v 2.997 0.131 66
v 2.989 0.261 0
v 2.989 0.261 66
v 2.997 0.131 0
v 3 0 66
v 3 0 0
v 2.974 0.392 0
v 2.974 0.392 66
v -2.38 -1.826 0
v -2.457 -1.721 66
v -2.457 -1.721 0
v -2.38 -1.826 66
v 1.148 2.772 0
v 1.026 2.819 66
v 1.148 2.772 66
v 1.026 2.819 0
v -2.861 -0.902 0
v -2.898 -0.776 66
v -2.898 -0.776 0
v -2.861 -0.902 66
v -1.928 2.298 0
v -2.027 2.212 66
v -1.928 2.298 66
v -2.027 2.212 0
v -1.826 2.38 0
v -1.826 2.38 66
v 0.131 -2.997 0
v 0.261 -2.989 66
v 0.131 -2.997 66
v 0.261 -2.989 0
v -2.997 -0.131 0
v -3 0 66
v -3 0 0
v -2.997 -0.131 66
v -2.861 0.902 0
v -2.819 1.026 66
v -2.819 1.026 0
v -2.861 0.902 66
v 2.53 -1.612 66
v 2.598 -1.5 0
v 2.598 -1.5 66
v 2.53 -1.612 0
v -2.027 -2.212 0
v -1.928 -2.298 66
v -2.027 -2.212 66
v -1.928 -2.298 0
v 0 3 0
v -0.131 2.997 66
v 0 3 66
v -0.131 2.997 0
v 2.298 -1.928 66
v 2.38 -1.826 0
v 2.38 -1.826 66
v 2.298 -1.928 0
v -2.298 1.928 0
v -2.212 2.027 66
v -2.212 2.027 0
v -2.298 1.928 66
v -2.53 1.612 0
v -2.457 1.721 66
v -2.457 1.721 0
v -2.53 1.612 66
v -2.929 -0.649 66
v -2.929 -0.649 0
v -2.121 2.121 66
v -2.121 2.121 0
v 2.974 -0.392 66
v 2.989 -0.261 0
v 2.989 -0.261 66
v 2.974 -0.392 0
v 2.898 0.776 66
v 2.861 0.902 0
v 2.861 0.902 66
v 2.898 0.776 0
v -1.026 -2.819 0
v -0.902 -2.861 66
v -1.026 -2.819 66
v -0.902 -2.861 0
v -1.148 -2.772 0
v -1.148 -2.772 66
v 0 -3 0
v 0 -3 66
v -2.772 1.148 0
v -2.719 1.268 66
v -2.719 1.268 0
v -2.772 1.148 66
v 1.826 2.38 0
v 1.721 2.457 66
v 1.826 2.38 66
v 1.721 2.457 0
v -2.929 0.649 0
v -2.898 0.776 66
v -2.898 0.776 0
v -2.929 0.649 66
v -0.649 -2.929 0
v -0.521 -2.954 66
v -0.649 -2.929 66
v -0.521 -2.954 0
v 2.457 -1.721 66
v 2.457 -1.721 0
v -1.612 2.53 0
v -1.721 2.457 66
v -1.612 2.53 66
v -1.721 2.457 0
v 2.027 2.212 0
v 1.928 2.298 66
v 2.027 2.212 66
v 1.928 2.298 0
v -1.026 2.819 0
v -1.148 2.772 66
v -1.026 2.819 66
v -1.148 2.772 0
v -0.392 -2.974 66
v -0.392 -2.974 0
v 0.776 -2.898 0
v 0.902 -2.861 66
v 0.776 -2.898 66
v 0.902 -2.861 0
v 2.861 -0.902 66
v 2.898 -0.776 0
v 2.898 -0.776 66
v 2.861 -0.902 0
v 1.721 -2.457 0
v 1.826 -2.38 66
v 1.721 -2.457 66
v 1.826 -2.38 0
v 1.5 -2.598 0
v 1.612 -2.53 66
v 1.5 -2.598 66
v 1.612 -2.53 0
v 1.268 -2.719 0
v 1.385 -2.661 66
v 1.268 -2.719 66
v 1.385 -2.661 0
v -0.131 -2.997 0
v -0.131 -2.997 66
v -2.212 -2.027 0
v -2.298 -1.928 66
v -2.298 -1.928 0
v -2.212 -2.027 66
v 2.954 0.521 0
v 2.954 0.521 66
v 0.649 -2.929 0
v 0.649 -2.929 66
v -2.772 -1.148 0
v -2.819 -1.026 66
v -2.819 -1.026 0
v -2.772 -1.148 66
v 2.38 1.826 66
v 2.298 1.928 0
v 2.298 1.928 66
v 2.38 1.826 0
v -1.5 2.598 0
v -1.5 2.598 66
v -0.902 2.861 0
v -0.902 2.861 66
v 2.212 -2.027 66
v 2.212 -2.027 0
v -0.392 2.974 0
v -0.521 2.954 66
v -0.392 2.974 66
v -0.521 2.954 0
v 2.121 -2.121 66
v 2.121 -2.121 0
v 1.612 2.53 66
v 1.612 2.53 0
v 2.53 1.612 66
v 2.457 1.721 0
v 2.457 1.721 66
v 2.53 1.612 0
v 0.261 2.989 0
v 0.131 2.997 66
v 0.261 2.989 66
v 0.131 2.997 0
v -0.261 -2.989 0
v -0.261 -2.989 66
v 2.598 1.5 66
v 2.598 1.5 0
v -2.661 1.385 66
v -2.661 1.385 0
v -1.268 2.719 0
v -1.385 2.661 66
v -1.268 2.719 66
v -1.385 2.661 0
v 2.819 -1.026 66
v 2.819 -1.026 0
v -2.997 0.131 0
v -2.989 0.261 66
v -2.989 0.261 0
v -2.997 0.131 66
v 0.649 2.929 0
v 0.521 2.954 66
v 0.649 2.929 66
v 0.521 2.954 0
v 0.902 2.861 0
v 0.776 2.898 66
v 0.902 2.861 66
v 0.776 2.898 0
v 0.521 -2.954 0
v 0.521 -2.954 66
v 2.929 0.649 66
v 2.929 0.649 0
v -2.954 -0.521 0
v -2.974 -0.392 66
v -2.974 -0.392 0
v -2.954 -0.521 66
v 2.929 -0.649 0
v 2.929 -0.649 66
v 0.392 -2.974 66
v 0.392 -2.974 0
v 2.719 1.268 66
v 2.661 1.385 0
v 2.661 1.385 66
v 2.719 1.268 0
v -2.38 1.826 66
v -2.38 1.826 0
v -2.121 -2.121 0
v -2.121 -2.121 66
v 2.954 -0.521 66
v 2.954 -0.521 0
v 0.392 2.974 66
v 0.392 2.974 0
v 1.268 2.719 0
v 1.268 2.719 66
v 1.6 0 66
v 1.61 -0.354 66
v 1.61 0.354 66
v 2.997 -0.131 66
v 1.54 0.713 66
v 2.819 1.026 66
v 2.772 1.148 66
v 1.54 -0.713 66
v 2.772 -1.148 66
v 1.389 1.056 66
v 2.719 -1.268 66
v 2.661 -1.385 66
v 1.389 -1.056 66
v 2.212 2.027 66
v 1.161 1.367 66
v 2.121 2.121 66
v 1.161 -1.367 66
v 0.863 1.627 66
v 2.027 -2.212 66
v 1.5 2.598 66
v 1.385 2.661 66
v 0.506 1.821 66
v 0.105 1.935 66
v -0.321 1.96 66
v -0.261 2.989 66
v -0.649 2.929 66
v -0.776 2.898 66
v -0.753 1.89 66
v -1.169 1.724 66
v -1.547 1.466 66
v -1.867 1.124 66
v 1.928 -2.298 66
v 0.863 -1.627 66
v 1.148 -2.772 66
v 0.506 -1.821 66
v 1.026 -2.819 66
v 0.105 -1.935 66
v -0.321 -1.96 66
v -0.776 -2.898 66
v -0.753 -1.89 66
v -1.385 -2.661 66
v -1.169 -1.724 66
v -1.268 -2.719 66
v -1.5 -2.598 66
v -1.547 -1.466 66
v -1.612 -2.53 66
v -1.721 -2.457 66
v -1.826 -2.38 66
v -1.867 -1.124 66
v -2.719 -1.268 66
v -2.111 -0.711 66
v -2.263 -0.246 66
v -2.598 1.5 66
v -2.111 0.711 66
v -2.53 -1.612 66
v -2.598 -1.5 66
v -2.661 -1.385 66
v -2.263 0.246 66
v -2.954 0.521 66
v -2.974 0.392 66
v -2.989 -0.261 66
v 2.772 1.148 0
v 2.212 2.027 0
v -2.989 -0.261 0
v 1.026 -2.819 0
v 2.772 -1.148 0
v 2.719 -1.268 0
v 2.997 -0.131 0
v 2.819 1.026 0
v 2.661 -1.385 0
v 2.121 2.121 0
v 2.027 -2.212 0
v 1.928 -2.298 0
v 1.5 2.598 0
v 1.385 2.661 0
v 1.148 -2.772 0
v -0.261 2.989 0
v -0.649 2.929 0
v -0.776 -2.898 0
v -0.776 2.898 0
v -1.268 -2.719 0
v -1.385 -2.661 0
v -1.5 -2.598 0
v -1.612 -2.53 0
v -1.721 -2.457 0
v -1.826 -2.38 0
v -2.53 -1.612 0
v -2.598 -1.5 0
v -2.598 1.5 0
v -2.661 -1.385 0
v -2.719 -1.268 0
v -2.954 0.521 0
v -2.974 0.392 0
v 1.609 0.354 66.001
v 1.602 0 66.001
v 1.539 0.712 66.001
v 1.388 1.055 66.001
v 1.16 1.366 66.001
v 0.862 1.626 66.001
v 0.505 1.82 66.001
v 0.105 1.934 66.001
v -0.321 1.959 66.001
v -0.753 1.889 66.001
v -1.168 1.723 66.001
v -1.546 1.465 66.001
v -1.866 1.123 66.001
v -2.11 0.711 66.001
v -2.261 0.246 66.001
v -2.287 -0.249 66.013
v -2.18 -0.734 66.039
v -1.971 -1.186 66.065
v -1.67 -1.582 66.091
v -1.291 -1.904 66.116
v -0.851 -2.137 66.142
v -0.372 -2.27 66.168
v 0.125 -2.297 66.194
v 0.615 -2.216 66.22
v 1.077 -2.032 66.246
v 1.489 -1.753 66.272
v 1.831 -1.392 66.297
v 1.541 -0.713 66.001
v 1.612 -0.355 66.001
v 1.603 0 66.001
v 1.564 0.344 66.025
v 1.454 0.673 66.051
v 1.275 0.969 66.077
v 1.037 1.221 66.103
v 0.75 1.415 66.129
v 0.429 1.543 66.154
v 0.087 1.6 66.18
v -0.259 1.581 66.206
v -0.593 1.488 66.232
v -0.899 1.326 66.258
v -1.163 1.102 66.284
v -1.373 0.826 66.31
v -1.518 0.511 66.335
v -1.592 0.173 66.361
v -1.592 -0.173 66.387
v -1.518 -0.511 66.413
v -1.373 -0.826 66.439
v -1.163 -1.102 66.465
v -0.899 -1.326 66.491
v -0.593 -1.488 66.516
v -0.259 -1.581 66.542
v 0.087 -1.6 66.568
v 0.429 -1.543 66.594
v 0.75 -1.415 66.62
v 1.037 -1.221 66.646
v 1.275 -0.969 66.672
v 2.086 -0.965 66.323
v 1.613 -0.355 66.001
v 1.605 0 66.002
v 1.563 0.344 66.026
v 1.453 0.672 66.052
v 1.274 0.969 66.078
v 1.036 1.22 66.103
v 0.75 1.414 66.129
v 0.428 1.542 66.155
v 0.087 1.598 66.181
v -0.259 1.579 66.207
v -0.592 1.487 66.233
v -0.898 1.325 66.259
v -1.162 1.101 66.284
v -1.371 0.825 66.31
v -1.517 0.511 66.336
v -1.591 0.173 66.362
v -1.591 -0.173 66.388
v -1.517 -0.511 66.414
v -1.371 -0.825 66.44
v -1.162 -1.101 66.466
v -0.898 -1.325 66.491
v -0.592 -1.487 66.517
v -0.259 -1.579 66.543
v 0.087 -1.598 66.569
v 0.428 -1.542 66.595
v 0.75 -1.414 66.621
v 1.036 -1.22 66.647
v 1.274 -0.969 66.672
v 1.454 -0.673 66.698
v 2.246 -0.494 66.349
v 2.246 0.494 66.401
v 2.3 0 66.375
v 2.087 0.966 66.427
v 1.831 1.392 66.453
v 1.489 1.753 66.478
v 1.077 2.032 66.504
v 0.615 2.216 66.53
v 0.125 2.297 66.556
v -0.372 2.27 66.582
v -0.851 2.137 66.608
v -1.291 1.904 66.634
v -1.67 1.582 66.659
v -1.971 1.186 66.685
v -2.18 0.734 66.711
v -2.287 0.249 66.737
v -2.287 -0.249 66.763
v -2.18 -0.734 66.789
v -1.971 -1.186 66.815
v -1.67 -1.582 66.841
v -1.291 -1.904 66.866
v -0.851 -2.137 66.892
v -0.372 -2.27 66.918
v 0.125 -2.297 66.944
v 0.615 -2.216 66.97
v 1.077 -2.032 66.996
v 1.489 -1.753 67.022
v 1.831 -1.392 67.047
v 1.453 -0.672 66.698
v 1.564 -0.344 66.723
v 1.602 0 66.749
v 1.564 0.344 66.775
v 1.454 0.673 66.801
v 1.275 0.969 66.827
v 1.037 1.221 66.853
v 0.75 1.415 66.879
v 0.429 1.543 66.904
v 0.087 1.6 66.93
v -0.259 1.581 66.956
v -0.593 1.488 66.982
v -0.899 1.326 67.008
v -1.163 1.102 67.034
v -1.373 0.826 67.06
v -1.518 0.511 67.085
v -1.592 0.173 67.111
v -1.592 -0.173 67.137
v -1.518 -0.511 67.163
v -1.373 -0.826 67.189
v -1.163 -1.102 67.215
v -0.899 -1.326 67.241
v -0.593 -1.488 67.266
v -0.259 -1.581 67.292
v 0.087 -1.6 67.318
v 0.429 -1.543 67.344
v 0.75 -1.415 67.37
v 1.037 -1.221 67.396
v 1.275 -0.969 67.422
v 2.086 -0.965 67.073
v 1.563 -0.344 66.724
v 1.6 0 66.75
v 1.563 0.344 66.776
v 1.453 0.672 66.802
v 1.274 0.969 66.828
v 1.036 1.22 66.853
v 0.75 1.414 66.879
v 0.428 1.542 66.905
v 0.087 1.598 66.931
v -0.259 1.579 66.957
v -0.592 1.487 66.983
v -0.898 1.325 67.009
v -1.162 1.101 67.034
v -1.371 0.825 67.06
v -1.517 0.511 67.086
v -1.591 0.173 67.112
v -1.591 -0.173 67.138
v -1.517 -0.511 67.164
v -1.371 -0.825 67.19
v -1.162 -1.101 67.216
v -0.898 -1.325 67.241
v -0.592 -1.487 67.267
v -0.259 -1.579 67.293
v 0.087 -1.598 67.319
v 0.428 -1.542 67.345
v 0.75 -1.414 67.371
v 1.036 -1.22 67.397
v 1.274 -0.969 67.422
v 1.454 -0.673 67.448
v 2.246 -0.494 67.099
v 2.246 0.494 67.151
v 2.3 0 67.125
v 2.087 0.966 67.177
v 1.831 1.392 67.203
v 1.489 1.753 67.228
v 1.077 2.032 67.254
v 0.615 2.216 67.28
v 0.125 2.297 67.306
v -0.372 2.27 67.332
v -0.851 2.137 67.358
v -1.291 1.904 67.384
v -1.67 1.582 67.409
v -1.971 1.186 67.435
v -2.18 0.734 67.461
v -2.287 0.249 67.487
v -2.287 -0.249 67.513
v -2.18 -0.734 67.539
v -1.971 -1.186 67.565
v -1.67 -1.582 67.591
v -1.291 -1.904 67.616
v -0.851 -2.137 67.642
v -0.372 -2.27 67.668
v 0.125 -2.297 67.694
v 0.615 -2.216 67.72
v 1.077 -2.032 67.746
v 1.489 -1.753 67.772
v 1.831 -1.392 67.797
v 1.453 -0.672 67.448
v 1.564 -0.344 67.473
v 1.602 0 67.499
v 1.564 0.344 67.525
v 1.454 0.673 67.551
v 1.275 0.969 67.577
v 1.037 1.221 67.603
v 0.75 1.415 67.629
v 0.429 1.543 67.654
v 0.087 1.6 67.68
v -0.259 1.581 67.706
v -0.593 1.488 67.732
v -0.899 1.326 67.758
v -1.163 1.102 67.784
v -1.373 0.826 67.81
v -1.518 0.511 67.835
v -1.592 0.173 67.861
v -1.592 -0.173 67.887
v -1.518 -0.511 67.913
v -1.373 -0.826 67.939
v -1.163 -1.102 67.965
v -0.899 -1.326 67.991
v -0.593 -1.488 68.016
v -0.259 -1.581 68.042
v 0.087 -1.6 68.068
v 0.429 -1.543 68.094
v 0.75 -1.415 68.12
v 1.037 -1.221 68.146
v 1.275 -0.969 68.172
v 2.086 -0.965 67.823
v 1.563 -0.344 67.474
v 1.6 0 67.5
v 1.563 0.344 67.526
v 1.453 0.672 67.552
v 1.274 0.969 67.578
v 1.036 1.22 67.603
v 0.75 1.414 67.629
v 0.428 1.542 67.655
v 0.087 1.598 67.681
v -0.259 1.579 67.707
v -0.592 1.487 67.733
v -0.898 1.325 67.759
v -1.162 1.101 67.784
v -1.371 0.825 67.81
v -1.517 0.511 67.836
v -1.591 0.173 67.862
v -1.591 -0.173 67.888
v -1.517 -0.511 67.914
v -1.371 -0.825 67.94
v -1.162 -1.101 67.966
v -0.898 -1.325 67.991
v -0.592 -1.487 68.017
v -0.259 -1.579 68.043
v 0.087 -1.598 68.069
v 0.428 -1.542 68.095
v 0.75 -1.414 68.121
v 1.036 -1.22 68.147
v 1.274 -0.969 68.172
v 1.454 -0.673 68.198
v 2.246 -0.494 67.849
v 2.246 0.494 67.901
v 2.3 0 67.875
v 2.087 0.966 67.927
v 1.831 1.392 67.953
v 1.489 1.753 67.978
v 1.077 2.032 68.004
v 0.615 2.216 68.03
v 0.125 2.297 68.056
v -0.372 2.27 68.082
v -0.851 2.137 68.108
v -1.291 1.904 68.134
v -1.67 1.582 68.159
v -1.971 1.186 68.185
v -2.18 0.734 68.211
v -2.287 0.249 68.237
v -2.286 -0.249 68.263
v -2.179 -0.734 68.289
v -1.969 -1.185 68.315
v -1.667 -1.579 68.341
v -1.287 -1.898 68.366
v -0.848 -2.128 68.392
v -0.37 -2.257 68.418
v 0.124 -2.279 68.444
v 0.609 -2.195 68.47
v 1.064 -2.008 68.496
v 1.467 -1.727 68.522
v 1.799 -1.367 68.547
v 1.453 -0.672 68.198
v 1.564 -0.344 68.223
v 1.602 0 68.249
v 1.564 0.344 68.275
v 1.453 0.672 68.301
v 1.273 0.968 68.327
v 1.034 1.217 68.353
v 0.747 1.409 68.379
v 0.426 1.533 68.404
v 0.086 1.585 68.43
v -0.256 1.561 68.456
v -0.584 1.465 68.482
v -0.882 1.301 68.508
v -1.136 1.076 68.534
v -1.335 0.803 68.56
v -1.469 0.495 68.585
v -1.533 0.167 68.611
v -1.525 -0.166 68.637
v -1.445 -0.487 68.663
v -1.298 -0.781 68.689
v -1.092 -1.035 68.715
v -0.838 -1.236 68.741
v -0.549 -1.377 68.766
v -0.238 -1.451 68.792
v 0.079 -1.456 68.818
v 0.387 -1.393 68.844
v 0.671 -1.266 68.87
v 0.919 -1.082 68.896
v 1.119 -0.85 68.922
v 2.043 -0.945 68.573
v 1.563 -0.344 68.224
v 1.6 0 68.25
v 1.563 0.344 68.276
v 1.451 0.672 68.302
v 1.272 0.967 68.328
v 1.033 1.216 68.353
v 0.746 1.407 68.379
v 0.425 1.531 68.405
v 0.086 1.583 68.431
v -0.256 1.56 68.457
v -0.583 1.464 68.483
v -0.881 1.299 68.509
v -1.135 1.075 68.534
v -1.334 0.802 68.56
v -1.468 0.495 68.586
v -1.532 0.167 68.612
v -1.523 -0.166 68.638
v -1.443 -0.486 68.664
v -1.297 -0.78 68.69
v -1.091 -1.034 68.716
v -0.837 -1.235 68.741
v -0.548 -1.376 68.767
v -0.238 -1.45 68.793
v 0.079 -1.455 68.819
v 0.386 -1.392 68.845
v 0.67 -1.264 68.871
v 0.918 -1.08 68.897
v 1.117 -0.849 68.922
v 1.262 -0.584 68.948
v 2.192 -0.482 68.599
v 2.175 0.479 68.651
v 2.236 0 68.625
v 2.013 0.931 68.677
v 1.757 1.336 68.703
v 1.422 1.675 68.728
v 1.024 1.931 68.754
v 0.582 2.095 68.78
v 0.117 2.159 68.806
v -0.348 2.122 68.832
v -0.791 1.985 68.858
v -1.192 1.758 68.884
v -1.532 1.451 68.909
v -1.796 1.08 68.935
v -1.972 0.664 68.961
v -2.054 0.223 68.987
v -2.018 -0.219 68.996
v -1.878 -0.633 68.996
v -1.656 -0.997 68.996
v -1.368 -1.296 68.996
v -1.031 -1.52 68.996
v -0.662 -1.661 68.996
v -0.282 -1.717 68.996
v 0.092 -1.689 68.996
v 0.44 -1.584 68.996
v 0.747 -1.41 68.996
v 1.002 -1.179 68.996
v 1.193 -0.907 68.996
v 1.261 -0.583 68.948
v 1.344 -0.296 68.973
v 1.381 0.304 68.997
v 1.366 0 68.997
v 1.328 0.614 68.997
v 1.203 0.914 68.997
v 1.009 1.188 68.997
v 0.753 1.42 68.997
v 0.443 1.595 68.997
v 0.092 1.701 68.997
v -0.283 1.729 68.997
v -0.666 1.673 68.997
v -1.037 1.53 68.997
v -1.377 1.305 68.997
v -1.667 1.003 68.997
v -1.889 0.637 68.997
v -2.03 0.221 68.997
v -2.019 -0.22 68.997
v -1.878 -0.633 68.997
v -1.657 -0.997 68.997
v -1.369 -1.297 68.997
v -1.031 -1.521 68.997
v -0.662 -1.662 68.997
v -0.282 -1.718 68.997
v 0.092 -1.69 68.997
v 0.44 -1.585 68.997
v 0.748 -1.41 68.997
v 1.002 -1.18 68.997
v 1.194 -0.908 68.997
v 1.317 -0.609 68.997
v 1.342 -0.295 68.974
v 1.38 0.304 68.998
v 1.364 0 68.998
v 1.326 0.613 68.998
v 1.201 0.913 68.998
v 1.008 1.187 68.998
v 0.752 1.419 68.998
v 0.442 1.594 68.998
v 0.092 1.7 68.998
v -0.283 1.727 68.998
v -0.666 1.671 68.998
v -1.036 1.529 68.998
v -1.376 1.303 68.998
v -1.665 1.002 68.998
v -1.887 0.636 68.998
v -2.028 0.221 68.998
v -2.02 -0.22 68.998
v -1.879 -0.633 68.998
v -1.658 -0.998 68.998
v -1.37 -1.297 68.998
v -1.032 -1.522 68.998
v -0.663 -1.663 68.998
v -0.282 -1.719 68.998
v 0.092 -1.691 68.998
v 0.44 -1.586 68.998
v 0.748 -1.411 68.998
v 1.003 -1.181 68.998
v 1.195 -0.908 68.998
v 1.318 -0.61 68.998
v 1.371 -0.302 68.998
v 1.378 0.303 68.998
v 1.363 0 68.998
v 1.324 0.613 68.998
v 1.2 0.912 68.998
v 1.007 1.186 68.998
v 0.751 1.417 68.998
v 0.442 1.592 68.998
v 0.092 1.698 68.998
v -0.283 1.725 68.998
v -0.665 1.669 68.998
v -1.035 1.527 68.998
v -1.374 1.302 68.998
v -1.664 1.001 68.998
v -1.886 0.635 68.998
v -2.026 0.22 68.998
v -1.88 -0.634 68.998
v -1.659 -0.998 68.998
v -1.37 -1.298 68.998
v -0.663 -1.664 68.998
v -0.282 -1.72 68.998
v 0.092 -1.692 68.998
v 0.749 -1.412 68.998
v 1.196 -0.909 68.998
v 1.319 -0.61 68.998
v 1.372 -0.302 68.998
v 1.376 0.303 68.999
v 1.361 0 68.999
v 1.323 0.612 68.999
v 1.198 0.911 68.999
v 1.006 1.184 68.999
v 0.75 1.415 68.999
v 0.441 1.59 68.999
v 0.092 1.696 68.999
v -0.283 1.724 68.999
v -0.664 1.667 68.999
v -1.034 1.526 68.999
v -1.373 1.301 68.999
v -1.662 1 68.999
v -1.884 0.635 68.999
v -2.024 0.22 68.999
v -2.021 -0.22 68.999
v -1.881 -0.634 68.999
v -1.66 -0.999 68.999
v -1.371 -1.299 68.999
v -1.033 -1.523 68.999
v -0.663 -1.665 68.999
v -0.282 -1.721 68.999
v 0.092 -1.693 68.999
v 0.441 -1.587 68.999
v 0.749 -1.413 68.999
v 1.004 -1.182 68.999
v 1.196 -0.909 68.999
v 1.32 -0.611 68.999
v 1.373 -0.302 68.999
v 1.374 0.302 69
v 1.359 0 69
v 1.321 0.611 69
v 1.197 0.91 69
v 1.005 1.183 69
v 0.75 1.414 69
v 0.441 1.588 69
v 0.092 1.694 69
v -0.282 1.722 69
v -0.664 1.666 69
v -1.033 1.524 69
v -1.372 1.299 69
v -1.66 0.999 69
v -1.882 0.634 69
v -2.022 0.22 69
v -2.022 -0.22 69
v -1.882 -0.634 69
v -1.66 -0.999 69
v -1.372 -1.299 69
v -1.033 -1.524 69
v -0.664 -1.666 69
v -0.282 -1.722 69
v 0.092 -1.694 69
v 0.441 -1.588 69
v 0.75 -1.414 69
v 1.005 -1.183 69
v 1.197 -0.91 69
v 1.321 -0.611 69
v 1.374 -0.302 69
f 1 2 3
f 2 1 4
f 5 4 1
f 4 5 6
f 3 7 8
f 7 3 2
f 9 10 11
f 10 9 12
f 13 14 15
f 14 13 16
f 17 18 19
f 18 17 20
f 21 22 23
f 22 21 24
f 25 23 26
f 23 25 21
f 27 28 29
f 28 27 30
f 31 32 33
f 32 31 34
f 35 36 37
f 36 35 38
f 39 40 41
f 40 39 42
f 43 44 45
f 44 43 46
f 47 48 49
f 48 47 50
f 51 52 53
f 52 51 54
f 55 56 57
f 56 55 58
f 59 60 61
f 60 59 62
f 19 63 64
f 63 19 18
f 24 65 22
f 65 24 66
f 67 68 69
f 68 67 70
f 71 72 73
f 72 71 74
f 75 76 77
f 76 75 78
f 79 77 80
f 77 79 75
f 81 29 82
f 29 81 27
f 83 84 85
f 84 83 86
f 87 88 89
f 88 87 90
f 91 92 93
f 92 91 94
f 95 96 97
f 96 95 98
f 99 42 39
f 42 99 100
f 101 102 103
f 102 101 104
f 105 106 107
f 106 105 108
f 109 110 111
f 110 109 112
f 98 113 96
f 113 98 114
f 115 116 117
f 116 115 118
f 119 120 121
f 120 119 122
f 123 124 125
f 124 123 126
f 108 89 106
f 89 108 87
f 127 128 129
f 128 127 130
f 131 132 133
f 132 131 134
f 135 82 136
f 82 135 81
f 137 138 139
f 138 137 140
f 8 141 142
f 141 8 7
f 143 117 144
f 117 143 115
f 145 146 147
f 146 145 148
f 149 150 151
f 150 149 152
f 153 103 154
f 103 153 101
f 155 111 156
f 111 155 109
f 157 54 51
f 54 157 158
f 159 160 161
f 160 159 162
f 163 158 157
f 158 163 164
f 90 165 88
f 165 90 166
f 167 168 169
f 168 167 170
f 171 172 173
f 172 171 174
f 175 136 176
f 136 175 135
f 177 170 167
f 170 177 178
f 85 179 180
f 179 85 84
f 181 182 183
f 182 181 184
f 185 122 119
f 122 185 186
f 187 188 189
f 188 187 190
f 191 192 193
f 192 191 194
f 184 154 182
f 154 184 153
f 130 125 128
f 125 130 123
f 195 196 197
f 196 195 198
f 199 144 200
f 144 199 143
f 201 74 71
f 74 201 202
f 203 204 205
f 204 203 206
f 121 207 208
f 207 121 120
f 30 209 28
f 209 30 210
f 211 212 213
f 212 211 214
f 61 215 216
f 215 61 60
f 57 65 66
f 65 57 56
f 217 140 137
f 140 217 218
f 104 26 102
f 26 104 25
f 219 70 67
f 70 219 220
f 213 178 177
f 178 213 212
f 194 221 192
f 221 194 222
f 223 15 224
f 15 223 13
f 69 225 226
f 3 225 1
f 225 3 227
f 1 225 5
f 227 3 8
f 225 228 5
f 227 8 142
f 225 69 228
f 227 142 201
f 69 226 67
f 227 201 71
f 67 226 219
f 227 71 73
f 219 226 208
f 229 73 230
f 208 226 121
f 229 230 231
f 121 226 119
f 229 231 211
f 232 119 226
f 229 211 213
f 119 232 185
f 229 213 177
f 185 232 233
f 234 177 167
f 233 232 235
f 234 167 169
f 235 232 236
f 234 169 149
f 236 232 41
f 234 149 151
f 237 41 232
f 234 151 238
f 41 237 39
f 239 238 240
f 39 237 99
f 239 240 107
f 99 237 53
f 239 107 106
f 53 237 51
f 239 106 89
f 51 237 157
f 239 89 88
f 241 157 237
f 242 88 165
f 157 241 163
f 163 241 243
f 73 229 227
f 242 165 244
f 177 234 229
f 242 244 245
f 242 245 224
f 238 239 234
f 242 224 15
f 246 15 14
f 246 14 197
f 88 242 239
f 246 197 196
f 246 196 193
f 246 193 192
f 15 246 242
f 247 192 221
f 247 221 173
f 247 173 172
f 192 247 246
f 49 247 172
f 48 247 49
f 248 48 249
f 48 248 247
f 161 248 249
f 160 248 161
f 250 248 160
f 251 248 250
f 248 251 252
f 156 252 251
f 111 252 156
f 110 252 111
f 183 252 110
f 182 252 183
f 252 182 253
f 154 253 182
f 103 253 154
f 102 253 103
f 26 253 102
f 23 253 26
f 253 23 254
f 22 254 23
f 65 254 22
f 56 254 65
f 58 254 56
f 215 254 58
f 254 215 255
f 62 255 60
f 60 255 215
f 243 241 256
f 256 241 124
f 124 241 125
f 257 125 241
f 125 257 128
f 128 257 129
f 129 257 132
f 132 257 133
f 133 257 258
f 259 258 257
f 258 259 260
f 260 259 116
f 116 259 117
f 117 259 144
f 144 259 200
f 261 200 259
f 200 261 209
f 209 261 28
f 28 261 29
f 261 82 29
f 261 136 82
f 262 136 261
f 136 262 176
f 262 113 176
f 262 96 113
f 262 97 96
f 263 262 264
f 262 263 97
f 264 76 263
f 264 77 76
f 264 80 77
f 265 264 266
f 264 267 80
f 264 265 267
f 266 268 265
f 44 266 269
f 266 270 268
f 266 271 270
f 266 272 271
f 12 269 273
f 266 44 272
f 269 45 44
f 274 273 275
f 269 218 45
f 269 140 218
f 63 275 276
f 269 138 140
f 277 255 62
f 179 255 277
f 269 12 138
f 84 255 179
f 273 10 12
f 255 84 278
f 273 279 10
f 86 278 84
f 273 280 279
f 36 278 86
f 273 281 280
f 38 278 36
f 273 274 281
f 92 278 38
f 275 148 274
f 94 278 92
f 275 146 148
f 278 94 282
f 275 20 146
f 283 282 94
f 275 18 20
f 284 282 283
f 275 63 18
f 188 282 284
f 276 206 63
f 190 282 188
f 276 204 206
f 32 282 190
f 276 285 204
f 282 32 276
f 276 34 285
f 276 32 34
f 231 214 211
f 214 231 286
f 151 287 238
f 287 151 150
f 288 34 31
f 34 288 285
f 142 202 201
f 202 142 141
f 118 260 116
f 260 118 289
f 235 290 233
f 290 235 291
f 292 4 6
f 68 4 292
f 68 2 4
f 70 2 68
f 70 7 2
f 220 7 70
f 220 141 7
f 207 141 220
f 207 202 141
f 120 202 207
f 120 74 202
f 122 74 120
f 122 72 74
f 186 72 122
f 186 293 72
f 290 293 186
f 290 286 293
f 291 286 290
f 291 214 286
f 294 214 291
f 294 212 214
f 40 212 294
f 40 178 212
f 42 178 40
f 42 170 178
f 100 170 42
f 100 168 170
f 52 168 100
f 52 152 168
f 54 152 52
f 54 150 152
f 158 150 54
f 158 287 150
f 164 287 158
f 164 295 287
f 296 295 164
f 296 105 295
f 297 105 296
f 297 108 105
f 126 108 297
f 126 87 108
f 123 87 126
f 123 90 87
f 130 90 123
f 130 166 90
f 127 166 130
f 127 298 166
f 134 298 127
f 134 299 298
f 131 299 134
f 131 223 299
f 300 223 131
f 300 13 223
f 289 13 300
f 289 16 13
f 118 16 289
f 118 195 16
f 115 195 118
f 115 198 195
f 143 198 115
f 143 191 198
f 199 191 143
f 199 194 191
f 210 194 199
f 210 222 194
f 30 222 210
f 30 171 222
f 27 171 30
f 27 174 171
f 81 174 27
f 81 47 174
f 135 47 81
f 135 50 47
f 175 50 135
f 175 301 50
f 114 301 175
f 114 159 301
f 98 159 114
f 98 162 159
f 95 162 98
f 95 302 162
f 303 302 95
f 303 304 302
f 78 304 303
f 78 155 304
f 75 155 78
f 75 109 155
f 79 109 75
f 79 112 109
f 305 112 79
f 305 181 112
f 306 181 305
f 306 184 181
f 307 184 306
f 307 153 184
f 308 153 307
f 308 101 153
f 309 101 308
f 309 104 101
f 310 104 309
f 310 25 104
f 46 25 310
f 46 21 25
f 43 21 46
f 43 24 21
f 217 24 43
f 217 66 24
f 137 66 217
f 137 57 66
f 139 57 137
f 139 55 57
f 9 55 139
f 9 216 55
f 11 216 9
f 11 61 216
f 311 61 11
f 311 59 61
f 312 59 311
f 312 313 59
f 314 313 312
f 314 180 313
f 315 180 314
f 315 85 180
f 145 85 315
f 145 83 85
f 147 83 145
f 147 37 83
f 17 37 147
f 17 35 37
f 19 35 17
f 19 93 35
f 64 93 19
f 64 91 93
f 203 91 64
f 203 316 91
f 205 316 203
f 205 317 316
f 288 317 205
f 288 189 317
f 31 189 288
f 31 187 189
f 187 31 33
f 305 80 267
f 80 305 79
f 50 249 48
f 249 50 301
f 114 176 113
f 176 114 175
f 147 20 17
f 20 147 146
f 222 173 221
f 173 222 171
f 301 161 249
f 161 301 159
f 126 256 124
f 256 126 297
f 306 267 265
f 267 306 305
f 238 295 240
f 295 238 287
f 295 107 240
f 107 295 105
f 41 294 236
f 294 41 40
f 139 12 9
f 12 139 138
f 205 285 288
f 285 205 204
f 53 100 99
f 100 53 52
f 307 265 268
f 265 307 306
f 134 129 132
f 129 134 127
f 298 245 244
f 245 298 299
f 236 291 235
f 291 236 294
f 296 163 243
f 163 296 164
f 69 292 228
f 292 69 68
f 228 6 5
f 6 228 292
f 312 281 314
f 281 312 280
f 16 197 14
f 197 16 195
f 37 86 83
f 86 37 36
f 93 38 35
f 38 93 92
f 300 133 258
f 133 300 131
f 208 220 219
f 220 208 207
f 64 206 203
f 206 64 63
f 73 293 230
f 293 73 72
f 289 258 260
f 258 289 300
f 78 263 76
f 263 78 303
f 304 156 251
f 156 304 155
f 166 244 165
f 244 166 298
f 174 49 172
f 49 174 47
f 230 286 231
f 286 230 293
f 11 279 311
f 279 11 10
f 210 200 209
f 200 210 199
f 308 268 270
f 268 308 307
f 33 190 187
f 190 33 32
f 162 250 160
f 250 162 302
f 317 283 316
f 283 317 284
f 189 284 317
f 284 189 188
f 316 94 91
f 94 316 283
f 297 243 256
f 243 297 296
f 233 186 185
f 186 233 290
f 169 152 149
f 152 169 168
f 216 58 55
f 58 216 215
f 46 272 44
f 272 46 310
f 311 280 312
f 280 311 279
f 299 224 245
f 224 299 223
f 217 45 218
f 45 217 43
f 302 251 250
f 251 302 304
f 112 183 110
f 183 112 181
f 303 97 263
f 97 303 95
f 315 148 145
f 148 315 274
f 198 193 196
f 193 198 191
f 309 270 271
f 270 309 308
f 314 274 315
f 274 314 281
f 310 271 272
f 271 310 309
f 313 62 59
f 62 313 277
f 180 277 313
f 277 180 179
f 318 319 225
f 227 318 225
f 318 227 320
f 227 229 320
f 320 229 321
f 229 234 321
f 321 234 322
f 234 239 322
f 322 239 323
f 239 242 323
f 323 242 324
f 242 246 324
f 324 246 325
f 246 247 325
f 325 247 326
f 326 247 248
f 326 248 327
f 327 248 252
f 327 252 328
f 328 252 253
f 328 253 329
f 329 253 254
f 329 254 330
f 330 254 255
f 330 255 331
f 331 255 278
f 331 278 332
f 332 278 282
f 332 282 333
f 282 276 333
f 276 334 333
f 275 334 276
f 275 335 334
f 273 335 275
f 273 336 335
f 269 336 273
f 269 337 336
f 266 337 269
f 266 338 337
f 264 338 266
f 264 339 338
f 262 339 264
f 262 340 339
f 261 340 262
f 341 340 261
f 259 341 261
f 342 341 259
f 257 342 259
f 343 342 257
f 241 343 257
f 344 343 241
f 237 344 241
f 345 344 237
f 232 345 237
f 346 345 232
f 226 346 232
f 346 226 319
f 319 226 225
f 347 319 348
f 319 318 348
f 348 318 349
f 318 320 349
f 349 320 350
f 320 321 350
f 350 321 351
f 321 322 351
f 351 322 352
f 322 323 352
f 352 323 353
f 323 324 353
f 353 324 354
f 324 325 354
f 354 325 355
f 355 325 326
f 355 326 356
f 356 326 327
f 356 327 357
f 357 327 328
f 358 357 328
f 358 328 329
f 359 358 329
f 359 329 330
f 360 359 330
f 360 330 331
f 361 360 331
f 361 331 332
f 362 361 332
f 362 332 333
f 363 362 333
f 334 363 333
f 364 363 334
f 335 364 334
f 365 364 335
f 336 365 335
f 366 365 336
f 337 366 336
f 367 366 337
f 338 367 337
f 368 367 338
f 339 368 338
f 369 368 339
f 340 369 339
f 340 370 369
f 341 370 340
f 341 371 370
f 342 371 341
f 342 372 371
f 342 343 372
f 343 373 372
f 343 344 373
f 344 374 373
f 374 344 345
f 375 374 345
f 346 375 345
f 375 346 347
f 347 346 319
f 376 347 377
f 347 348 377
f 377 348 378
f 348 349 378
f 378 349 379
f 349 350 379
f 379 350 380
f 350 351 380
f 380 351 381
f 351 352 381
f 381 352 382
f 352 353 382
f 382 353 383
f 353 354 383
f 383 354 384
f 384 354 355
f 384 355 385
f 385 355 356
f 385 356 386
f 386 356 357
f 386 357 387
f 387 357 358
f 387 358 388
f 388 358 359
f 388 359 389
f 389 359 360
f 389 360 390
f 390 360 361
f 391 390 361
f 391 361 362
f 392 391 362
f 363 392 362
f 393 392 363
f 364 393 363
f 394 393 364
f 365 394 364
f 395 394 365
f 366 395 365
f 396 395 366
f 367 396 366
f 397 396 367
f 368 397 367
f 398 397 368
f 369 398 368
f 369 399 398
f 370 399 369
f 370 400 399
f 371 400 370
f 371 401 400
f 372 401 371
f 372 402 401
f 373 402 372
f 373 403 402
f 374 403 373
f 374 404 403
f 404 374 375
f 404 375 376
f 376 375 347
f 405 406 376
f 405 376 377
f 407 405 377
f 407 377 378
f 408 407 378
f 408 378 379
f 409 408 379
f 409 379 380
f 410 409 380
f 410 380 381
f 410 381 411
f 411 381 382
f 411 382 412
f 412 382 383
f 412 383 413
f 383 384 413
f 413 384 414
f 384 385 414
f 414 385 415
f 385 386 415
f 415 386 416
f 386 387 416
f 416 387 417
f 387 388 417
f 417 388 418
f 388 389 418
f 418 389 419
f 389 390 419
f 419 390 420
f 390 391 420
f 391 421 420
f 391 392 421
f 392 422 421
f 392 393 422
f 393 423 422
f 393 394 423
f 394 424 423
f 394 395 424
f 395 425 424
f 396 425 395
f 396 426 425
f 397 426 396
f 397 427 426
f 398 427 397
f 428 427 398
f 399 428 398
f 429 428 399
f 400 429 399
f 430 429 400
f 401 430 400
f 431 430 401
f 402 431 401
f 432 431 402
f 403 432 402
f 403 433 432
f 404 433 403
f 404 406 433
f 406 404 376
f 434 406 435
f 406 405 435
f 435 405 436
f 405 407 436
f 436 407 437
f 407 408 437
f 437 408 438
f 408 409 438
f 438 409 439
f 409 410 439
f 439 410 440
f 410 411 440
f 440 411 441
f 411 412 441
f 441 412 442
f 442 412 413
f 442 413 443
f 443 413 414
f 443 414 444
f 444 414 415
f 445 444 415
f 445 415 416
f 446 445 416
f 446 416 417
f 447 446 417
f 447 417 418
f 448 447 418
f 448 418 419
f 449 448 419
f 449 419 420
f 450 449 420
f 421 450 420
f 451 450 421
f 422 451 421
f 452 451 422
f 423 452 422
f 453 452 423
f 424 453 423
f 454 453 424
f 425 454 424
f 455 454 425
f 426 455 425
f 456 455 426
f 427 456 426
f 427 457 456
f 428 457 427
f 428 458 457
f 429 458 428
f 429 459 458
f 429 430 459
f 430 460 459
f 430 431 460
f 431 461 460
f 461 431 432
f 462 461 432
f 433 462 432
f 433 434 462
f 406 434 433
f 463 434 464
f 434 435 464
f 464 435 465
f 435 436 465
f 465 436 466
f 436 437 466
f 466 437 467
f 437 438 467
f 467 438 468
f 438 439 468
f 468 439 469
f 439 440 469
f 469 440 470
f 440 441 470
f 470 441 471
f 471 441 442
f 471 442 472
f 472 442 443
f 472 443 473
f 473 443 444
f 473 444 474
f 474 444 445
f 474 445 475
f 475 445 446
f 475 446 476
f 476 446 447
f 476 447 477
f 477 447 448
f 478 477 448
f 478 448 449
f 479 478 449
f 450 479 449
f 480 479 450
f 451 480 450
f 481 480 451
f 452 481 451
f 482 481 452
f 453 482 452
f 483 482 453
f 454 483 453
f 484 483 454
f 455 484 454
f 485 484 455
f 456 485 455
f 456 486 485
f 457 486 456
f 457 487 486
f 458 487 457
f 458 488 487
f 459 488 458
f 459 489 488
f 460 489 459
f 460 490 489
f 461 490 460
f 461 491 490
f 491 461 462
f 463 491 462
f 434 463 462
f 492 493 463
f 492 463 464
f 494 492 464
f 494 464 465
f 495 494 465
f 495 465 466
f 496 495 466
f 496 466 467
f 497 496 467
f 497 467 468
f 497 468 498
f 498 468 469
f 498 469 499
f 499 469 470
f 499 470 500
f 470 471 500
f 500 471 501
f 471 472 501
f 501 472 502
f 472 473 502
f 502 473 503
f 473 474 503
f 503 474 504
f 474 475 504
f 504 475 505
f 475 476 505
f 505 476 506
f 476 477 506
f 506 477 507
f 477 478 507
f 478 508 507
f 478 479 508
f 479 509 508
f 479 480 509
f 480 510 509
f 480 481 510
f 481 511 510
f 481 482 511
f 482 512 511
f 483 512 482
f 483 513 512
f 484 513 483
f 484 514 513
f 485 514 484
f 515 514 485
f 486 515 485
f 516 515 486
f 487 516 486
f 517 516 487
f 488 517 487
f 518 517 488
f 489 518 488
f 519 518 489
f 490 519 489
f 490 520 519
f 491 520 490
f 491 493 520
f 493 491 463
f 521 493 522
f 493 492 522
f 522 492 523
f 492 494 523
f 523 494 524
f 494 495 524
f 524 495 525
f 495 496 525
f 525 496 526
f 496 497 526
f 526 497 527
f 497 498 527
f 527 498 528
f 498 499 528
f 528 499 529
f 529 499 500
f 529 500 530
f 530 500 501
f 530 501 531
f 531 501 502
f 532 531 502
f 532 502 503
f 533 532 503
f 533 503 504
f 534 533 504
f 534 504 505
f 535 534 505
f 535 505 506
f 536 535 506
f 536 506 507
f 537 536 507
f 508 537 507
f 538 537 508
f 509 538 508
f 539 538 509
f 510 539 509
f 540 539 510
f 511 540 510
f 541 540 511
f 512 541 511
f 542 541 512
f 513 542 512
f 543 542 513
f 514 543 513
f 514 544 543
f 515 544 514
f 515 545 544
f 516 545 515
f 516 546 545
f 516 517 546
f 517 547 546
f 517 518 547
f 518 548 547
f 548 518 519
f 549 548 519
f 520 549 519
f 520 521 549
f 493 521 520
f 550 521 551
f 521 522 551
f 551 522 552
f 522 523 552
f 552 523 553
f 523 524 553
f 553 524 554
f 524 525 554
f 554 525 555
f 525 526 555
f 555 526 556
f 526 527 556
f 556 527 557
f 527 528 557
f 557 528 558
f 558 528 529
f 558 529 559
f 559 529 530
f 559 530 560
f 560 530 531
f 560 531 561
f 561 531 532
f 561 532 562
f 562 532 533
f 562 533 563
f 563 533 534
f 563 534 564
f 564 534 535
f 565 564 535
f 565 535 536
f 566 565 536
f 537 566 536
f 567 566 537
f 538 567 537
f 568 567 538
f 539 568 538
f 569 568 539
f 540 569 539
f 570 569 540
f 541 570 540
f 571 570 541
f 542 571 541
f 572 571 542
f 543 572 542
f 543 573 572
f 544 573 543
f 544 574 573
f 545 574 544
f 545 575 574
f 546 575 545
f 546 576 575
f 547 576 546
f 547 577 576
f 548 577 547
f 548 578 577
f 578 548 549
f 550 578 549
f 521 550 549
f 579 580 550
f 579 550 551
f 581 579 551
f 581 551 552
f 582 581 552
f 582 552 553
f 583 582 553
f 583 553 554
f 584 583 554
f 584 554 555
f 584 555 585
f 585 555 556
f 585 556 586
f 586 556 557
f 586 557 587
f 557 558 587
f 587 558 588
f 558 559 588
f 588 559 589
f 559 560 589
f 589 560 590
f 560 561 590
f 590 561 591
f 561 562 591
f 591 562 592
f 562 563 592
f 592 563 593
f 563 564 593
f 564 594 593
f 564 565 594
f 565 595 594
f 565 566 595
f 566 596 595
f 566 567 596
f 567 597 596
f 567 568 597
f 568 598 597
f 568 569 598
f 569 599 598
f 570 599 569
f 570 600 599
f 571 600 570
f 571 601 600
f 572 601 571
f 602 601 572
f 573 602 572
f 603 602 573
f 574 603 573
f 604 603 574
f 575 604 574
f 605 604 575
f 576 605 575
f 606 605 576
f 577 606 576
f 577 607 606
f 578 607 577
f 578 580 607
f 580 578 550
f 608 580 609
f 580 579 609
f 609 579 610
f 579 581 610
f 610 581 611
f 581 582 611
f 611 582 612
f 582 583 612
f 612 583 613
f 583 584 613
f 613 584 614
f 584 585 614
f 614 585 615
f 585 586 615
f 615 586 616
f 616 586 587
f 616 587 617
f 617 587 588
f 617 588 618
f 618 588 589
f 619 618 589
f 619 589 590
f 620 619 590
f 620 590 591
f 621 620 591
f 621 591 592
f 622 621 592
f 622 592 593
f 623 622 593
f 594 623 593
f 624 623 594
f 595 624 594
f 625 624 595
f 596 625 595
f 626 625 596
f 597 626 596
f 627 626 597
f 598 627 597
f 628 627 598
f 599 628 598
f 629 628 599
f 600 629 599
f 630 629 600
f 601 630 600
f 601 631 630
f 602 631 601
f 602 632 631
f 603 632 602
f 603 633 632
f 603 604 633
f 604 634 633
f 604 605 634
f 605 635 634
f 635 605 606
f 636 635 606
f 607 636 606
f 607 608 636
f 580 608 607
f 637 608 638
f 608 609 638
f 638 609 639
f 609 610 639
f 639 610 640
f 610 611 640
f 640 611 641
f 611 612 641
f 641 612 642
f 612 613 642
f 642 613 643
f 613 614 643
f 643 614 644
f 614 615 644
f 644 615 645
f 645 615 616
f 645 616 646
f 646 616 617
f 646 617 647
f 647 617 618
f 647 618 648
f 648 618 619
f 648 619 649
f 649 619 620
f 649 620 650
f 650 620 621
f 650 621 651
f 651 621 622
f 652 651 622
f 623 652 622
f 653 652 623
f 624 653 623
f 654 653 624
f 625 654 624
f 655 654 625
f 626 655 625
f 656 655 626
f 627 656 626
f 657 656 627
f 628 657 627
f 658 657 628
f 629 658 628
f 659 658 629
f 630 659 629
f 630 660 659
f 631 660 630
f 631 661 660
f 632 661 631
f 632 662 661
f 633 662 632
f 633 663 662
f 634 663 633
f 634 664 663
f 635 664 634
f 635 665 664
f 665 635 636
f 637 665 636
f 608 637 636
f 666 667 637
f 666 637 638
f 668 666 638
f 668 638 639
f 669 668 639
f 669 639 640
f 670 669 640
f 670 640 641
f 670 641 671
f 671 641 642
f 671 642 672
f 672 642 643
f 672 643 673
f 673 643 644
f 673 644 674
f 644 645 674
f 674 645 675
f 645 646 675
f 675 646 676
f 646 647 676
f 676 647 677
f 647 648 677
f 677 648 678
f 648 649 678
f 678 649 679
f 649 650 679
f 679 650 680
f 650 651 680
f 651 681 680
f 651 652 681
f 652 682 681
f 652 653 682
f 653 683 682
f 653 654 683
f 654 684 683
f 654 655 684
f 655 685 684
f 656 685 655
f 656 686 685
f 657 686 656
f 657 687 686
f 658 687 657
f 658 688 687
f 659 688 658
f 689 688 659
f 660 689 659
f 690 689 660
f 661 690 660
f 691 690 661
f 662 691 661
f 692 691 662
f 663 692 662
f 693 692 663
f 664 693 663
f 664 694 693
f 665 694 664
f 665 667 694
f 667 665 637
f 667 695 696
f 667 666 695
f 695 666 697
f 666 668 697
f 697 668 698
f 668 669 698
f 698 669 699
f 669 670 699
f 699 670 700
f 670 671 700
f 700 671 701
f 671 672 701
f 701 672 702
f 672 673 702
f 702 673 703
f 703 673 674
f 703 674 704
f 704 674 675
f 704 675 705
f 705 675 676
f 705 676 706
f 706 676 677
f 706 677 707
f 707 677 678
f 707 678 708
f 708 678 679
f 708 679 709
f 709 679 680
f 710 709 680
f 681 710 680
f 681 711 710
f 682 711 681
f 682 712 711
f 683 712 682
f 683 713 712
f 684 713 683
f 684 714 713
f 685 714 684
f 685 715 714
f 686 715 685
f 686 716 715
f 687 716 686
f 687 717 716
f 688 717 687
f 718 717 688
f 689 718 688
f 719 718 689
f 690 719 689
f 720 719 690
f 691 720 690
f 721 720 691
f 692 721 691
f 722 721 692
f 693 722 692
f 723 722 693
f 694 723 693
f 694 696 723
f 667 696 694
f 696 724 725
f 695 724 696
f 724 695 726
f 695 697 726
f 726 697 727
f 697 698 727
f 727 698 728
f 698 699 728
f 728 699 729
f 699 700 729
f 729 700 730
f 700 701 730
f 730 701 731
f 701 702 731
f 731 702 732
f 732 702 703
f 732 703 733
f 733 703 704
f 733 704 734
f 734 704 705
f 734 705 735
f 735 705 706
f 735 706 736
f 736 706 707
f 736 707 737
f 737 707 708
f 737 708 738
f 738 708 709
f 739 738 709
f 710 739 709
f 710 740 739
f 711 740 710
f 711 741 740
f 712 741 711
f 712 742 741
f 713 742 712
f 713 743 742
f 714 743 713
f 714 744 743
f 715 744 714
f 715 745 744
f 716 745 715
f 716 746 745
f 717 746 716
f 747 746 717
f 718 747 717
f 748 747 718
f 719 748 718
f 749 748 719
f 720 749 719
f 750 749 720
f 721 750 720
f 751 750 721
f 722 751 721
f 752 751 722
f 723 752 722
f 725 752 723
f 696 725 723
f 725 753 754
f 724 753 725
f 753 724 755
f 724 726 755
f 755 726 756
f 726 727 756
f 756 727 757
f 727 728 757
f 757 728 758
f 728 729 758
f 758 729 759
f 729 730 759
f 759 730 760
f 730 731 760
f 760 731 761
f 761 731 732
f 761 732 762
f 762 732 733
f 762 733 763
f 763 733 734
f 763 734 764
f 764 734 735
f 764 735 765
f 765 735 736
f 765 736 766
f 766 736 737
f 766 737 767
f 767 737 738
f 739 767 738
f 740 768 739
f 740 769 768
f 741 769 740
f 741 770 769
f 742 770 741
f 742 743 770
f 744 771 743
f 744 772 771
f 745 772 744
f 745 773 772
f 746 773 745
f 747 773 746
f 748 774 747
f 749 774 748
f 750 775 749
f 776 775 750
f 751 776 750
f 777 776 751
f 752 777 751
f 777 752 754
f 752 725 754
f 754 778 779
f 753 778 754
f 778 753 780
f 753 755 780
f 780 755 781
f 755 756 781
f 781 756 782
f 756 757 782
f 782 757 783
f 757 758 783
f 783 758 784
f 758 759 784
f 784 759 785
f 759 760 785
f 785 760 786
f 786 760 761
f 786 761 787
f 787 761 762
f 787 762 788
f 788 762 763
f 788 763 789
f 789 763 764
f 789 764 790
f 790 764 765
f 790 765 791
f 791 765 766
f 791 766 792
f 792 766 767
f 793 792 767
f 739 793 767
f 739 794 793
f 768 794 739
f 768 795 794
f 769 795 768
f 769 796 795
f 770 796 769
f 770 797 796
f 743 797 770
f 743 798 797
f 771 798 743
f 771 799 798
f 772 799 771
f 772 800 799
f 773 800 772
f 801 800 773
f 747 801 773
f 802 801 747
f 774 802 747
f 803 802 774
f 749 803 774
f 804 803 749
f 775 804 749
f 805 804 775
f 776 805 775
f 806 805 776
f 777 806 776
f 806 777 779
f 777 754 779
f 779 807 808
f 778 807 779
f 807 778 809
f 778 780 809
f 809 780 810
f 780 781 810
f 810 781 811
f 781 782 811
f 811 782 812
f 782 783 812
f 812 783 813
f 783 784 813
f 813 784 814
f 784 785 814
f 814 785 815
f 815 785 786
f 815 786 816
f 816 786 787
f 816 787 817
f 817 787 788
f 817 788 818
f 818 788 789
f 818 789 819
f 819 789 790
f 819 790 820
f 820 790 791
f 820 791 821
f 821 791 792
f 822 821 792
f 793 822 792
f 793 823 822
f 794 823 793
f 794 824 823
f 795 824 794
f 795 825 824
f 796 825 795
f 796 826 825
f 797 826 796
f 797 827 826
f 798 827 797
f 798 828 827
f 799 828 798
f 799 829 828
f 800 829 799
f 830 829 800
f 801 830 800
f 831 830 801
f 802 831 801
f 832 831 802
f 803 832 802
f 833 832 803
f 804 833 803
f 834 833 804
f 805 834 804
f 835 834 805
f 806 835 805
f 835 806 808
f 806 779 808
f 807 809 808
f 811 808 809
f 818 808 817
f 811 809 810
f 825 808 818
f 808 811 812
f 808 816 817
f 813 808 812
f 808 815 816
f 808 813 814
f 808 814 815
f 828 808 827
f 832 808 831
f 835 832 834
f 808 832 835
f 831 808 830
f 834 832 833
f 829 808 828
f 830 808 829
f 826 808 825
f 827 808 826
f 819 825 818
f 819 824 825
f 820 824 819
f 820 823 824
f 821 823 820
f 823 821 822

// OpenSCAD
// Created 2016-2017 by Ryan A. Colyer.
// This work is released with CC0 into the public domain.
// https://creativecommons.org/publicdomain/zero/1.0/
//
// https://www.thingiverse.com/thing:1686322
//
// v2.1

$fn = 100;

screw_resolution = 0.5;  // in mm

// Legs
leg_diameter = 6;
leg_height = 66;

// Provides standard metric thread pitches.
function ThreadPitch(diameter) =
  (diameter <= 64) ?
    lookup(diameter, [
      [2, 0.4],
      [2.5, 0.45],
      [3, 0.5],
      [4, 0.7],
      [5, 0.8],
      [6, 1.0],
      [7, 1.0],
      [8, 1.25],
      [10, 1.5],
      [12, 1.75],
      [14, 2.0],
      [16, 2.0],
      [18, 2.5],
      [20, 2.5],
      [22, 2.5],
      [24, 3.0],
      [27, 3.0],
      [30, 3.5],
      [33, 3.5],
      [36, 4.0],
      [39, 4.0],
      [42, 4.5],
      [48, 5.0],
      [52, 5.0],
      [56, 5.5],
      [60, 5.5],
      [64, 6.0]
    ]) :
    diameter * 6.0 / 64;


// This generates a closed polyhedron from an array of arrays of points,
// with each inner array tracing out one loop outlining the polyhedron.
// pointarrays should contain an array of N arrays each of size P outlining a
// closed manifold.  The points must obey the right-hand rule.  For example,
// looking down, the P points in the inner arrays are counter-clockwise in a
// loop, while the N point arrays increase in height.  Points in each inner
// array do not need to be equal height, but they usually should not meet or
// cross the line segments from the adjacent points in the other arrays.
// (N>=2, P>=3)
// Core triangles:
//   [j][i], [j+1][i], [j+1][(i+1)%P]
//   [j][i], [j+1][(i+1)%P], [j][(i+1)%P]
//   Then triangles are formed in a loop with the middle point of the first
//   and last array.
module ClosePoints(pointarrays) {
  function recurse_avg(arr, n=0, p=[0,0,0]) = (n>=len(arr)) ? p :
    recurse_avg(arr, n+1, p+(arr[n]-p)/(n+1));

  N = len(pointarrays);
  P = len(pointarrays[0]);
  NP = N*P;
  lastarr = pointarrays[N-1];
  midbot = recurse_avg(pointarrays[0]);
  midtop = recurse_avg(pointarrays[N-1]);

  faces_bot = [
    for (i=[0:P-1])
      [0,i+1,1+(i+1)%len(pointarrays[0])]
  ];

  loop_offset = 1;
  bot_len = loop_offset + P;

  faces_loop = [
    for (j=[0:N-2], i=[0:P-1], t=[0:1])
      [loop_offset, loop_offset, loop_offset] + (t==0 ?
      [j*P+i, (j+1)*P+i, (j+1)*P+(i+1)%P] :
      [j*P+i, (j+1)*P+(i+1)%P, j*P+(i+1)%P])
  ];

  top_offset = loop_offset + NP - P;
  midtop_offset = top_offset + P;

  faces_top = [
    for (i=[0:P-1])
      [midtop_offset,top_offset+(i+1)%P,top_offset+i]
  ];

  points = [
    for (i=[-1:NP])
      (i<0) ? midbot :
      ((i==NP) ? midtop :
      pointarrays[floor(i/P)][i%P])
  ];
  faces = concat(faces_bot, faces_loop, faces_top);

  polyhedron(points=points, faces=faces);
}

// This creates a vertical rod at the origin with external threads.  It uses
// metric standards by default.
module ScrewThread(outer_diam, height, pitch=0, tooth_angle=30, tolerance=0.4, tip_height=0, tooth_height=0, tip_min_fract=0) {

  pitch = (pitch==0) ? ThreadPitch(outer_diam) : pitch;
  tooth_height = (tooth_height==0) ? pitch : tooth_height;
  tip_min_fract = (tip_min_fract<0) ? 0 :
    ((tip_min_fract>0.9999) ? 0.9999 : tip_min_fract);

  outer_diam_cor = outer_diam + 0.25*tolerance; // Plastic shrinkage correction
  inner_diam = outer_diam - tooth_height/tan(tooth_angle);
  or = (outer_diam_cor < screw_resolution) ?
    screw_resolution/2 : outer_diam_cor / 2;
  ir = (inner_diam < screw_resolution) ? screw_resolution/2 : inner_diam / 2;
  height = (height < screw_resolution) ? screw_resolution : height;

  steps_per_loop_try = ceil(2*3.14159265359*or / screw_resolution);
  steps_per_loop = (steps_per_loop_try < 4) ? 4 : steps_per_loop_try;
  hs_ext = 3;
  hsteps = ceil(3 * height / pitch) + 2*hs_ext;

  extent = or - ir;

  tip_start = height-tip_height;
  tip_height_sc = tip_height / (1-tip_min_fract);

  tip_height_ir = (tip_height_sc > tooth_height/2) ?
    tip_height_sc - tooth_height/2 : tip_height_sc;

  tip_height_w = (tip_height_sc > tooth_height) ? tooth_height : tip_height_sc;
  tip_wstart = height + tip_height_sc - tip_height - tip_height_w;


  function tooth_width(a, h, pitch, tooth_height, extent) =
    let(
      ang_full = h*360.0/pitch-a,
      ang_pn = atan2(sin(ang_full), cos(ang_full)),
      ang = ang_pn < 0 ? ang_pn+360 : ang_pn,
      frac = ang/360,
      tfrac_half = tooth_height / (2*pitch),
      tfrac_cut = 2*tfrac_half
    )
    (frac > tfrac_cut) ? 0 : (
      (frac <= tfrac_half) ?
        ((frac / tfrac_half) * extent) :
        ((1 - (frac - tfrac_half)/tfrac_half) * extent)
    );


  pointarrays = [
    for (hs=[0:hsteps])
      [
        for (s=[0:steps_per_loop-1])
          let(
            ang_full = s*360.0/steps_per_loop,
            ang_pn = atan2(sin(ang_full), cos(ang_full)),
            ang = ang_pn < 0 ? ang_pn+360 : ang_pn,

            h_fudge = pitch*0.001,

            h_mod =
              (hs%3 == 2) ?
                ((s == steps_per_loop-1) ? tooth_height - h_fudge : (
                 (s == steps_per_loop-2) ? tooth_height/2 : 0)) : (
              (hs%3 == 0) ?
                ((s == steps_per_loop-1) ? pitch-tooth_height/2 : (
                 (s == steps_per_loop-2) ? pitch-tooth_height + h_fudge : 0)) :
                ((s == steps_per_loop-1) ? pitch-tooth_height/2 + h_fudge : (
                 (s == steps_per_loop-2) ? tooth_height/2 : 0))
              ),

            h_level =
              (hs%3 == 2) ? tooth_height - h_fudge : (
              (hs%3 == 0) ? 0 : tooth_height/2),

            h_ub = floor((hs-hs_ext)/3) * pitch
              + h_level + ang*pitch/360.0 - h_mod,
            h_max = height - (hsteps-hs) * h_fudge,
            h_min = hs * h_fudge,
            h = (h_ub < h_min) ? h_min : ((h_ub > h_max) ? h_max : h_ub),

            ht = h - tip_start,
            hf_ir = ht/tip_height_ir,
            ht_w = h - tip_wstart,
            hf_w_t = ht_w/tip_height_w,
            hf_w = (hf_w_t < 0) ? 0 : ((hf_w_t > 1) ? 1 : hf_w_t),

            ext_tip = (h <= tip_wstart) ? extent : (1-hf_w) * extent,
            wnormal = tooth_width(ang, h, pitch, tooth_height, ext_tip),
            w = (h <= tip_wstart) ? wnormal :
              (1-hf_w) * wnormal +
              hf_w * (0.1*screw_resolution + (wnormal * wnormal * wnormal /
                (ext_tip*ext_tip+0.1*screw_resolution))),
            r = (ht <= 0) ? ir + w :
              ( (ht < tip_height_ir ? ((2/(1+(hf_ir*hf_ir))-1) * ir) : 0) + w)
          )
          [r*cos(ang), r*sin(ang), h]
      ]
  ];


  ClosePoints(pointarrays);
}

// Solid rod on the bottom, external threads on the top.
module RodStart(height, diameter, thread_len=0, thread_diam=0, thread_pitch=0) {
  // A reasonable default.
  thread_diam = (thread_diam==0) ? 0.75*diameter : thread_diam;
  thread_len = (thread_len==0) ? 0.5*diameter : thread_len;
  thread_pitch = (thread_pitch==0) ? ThreadPitch(thread_diam) : thread_pitch;

  cylinder(r=diameter/2, h=height, $fn=24*diameter);

  translate([0, 0, height])
    ScrewThread(thread_diam, thread_len, thread_pitch,
      tip_height=thread_pitch, tip_min_fract=0.75);
}

// Legs
module leg() {
  RodStart(leg_height, leg_diameter);
}

// Render
leg();
